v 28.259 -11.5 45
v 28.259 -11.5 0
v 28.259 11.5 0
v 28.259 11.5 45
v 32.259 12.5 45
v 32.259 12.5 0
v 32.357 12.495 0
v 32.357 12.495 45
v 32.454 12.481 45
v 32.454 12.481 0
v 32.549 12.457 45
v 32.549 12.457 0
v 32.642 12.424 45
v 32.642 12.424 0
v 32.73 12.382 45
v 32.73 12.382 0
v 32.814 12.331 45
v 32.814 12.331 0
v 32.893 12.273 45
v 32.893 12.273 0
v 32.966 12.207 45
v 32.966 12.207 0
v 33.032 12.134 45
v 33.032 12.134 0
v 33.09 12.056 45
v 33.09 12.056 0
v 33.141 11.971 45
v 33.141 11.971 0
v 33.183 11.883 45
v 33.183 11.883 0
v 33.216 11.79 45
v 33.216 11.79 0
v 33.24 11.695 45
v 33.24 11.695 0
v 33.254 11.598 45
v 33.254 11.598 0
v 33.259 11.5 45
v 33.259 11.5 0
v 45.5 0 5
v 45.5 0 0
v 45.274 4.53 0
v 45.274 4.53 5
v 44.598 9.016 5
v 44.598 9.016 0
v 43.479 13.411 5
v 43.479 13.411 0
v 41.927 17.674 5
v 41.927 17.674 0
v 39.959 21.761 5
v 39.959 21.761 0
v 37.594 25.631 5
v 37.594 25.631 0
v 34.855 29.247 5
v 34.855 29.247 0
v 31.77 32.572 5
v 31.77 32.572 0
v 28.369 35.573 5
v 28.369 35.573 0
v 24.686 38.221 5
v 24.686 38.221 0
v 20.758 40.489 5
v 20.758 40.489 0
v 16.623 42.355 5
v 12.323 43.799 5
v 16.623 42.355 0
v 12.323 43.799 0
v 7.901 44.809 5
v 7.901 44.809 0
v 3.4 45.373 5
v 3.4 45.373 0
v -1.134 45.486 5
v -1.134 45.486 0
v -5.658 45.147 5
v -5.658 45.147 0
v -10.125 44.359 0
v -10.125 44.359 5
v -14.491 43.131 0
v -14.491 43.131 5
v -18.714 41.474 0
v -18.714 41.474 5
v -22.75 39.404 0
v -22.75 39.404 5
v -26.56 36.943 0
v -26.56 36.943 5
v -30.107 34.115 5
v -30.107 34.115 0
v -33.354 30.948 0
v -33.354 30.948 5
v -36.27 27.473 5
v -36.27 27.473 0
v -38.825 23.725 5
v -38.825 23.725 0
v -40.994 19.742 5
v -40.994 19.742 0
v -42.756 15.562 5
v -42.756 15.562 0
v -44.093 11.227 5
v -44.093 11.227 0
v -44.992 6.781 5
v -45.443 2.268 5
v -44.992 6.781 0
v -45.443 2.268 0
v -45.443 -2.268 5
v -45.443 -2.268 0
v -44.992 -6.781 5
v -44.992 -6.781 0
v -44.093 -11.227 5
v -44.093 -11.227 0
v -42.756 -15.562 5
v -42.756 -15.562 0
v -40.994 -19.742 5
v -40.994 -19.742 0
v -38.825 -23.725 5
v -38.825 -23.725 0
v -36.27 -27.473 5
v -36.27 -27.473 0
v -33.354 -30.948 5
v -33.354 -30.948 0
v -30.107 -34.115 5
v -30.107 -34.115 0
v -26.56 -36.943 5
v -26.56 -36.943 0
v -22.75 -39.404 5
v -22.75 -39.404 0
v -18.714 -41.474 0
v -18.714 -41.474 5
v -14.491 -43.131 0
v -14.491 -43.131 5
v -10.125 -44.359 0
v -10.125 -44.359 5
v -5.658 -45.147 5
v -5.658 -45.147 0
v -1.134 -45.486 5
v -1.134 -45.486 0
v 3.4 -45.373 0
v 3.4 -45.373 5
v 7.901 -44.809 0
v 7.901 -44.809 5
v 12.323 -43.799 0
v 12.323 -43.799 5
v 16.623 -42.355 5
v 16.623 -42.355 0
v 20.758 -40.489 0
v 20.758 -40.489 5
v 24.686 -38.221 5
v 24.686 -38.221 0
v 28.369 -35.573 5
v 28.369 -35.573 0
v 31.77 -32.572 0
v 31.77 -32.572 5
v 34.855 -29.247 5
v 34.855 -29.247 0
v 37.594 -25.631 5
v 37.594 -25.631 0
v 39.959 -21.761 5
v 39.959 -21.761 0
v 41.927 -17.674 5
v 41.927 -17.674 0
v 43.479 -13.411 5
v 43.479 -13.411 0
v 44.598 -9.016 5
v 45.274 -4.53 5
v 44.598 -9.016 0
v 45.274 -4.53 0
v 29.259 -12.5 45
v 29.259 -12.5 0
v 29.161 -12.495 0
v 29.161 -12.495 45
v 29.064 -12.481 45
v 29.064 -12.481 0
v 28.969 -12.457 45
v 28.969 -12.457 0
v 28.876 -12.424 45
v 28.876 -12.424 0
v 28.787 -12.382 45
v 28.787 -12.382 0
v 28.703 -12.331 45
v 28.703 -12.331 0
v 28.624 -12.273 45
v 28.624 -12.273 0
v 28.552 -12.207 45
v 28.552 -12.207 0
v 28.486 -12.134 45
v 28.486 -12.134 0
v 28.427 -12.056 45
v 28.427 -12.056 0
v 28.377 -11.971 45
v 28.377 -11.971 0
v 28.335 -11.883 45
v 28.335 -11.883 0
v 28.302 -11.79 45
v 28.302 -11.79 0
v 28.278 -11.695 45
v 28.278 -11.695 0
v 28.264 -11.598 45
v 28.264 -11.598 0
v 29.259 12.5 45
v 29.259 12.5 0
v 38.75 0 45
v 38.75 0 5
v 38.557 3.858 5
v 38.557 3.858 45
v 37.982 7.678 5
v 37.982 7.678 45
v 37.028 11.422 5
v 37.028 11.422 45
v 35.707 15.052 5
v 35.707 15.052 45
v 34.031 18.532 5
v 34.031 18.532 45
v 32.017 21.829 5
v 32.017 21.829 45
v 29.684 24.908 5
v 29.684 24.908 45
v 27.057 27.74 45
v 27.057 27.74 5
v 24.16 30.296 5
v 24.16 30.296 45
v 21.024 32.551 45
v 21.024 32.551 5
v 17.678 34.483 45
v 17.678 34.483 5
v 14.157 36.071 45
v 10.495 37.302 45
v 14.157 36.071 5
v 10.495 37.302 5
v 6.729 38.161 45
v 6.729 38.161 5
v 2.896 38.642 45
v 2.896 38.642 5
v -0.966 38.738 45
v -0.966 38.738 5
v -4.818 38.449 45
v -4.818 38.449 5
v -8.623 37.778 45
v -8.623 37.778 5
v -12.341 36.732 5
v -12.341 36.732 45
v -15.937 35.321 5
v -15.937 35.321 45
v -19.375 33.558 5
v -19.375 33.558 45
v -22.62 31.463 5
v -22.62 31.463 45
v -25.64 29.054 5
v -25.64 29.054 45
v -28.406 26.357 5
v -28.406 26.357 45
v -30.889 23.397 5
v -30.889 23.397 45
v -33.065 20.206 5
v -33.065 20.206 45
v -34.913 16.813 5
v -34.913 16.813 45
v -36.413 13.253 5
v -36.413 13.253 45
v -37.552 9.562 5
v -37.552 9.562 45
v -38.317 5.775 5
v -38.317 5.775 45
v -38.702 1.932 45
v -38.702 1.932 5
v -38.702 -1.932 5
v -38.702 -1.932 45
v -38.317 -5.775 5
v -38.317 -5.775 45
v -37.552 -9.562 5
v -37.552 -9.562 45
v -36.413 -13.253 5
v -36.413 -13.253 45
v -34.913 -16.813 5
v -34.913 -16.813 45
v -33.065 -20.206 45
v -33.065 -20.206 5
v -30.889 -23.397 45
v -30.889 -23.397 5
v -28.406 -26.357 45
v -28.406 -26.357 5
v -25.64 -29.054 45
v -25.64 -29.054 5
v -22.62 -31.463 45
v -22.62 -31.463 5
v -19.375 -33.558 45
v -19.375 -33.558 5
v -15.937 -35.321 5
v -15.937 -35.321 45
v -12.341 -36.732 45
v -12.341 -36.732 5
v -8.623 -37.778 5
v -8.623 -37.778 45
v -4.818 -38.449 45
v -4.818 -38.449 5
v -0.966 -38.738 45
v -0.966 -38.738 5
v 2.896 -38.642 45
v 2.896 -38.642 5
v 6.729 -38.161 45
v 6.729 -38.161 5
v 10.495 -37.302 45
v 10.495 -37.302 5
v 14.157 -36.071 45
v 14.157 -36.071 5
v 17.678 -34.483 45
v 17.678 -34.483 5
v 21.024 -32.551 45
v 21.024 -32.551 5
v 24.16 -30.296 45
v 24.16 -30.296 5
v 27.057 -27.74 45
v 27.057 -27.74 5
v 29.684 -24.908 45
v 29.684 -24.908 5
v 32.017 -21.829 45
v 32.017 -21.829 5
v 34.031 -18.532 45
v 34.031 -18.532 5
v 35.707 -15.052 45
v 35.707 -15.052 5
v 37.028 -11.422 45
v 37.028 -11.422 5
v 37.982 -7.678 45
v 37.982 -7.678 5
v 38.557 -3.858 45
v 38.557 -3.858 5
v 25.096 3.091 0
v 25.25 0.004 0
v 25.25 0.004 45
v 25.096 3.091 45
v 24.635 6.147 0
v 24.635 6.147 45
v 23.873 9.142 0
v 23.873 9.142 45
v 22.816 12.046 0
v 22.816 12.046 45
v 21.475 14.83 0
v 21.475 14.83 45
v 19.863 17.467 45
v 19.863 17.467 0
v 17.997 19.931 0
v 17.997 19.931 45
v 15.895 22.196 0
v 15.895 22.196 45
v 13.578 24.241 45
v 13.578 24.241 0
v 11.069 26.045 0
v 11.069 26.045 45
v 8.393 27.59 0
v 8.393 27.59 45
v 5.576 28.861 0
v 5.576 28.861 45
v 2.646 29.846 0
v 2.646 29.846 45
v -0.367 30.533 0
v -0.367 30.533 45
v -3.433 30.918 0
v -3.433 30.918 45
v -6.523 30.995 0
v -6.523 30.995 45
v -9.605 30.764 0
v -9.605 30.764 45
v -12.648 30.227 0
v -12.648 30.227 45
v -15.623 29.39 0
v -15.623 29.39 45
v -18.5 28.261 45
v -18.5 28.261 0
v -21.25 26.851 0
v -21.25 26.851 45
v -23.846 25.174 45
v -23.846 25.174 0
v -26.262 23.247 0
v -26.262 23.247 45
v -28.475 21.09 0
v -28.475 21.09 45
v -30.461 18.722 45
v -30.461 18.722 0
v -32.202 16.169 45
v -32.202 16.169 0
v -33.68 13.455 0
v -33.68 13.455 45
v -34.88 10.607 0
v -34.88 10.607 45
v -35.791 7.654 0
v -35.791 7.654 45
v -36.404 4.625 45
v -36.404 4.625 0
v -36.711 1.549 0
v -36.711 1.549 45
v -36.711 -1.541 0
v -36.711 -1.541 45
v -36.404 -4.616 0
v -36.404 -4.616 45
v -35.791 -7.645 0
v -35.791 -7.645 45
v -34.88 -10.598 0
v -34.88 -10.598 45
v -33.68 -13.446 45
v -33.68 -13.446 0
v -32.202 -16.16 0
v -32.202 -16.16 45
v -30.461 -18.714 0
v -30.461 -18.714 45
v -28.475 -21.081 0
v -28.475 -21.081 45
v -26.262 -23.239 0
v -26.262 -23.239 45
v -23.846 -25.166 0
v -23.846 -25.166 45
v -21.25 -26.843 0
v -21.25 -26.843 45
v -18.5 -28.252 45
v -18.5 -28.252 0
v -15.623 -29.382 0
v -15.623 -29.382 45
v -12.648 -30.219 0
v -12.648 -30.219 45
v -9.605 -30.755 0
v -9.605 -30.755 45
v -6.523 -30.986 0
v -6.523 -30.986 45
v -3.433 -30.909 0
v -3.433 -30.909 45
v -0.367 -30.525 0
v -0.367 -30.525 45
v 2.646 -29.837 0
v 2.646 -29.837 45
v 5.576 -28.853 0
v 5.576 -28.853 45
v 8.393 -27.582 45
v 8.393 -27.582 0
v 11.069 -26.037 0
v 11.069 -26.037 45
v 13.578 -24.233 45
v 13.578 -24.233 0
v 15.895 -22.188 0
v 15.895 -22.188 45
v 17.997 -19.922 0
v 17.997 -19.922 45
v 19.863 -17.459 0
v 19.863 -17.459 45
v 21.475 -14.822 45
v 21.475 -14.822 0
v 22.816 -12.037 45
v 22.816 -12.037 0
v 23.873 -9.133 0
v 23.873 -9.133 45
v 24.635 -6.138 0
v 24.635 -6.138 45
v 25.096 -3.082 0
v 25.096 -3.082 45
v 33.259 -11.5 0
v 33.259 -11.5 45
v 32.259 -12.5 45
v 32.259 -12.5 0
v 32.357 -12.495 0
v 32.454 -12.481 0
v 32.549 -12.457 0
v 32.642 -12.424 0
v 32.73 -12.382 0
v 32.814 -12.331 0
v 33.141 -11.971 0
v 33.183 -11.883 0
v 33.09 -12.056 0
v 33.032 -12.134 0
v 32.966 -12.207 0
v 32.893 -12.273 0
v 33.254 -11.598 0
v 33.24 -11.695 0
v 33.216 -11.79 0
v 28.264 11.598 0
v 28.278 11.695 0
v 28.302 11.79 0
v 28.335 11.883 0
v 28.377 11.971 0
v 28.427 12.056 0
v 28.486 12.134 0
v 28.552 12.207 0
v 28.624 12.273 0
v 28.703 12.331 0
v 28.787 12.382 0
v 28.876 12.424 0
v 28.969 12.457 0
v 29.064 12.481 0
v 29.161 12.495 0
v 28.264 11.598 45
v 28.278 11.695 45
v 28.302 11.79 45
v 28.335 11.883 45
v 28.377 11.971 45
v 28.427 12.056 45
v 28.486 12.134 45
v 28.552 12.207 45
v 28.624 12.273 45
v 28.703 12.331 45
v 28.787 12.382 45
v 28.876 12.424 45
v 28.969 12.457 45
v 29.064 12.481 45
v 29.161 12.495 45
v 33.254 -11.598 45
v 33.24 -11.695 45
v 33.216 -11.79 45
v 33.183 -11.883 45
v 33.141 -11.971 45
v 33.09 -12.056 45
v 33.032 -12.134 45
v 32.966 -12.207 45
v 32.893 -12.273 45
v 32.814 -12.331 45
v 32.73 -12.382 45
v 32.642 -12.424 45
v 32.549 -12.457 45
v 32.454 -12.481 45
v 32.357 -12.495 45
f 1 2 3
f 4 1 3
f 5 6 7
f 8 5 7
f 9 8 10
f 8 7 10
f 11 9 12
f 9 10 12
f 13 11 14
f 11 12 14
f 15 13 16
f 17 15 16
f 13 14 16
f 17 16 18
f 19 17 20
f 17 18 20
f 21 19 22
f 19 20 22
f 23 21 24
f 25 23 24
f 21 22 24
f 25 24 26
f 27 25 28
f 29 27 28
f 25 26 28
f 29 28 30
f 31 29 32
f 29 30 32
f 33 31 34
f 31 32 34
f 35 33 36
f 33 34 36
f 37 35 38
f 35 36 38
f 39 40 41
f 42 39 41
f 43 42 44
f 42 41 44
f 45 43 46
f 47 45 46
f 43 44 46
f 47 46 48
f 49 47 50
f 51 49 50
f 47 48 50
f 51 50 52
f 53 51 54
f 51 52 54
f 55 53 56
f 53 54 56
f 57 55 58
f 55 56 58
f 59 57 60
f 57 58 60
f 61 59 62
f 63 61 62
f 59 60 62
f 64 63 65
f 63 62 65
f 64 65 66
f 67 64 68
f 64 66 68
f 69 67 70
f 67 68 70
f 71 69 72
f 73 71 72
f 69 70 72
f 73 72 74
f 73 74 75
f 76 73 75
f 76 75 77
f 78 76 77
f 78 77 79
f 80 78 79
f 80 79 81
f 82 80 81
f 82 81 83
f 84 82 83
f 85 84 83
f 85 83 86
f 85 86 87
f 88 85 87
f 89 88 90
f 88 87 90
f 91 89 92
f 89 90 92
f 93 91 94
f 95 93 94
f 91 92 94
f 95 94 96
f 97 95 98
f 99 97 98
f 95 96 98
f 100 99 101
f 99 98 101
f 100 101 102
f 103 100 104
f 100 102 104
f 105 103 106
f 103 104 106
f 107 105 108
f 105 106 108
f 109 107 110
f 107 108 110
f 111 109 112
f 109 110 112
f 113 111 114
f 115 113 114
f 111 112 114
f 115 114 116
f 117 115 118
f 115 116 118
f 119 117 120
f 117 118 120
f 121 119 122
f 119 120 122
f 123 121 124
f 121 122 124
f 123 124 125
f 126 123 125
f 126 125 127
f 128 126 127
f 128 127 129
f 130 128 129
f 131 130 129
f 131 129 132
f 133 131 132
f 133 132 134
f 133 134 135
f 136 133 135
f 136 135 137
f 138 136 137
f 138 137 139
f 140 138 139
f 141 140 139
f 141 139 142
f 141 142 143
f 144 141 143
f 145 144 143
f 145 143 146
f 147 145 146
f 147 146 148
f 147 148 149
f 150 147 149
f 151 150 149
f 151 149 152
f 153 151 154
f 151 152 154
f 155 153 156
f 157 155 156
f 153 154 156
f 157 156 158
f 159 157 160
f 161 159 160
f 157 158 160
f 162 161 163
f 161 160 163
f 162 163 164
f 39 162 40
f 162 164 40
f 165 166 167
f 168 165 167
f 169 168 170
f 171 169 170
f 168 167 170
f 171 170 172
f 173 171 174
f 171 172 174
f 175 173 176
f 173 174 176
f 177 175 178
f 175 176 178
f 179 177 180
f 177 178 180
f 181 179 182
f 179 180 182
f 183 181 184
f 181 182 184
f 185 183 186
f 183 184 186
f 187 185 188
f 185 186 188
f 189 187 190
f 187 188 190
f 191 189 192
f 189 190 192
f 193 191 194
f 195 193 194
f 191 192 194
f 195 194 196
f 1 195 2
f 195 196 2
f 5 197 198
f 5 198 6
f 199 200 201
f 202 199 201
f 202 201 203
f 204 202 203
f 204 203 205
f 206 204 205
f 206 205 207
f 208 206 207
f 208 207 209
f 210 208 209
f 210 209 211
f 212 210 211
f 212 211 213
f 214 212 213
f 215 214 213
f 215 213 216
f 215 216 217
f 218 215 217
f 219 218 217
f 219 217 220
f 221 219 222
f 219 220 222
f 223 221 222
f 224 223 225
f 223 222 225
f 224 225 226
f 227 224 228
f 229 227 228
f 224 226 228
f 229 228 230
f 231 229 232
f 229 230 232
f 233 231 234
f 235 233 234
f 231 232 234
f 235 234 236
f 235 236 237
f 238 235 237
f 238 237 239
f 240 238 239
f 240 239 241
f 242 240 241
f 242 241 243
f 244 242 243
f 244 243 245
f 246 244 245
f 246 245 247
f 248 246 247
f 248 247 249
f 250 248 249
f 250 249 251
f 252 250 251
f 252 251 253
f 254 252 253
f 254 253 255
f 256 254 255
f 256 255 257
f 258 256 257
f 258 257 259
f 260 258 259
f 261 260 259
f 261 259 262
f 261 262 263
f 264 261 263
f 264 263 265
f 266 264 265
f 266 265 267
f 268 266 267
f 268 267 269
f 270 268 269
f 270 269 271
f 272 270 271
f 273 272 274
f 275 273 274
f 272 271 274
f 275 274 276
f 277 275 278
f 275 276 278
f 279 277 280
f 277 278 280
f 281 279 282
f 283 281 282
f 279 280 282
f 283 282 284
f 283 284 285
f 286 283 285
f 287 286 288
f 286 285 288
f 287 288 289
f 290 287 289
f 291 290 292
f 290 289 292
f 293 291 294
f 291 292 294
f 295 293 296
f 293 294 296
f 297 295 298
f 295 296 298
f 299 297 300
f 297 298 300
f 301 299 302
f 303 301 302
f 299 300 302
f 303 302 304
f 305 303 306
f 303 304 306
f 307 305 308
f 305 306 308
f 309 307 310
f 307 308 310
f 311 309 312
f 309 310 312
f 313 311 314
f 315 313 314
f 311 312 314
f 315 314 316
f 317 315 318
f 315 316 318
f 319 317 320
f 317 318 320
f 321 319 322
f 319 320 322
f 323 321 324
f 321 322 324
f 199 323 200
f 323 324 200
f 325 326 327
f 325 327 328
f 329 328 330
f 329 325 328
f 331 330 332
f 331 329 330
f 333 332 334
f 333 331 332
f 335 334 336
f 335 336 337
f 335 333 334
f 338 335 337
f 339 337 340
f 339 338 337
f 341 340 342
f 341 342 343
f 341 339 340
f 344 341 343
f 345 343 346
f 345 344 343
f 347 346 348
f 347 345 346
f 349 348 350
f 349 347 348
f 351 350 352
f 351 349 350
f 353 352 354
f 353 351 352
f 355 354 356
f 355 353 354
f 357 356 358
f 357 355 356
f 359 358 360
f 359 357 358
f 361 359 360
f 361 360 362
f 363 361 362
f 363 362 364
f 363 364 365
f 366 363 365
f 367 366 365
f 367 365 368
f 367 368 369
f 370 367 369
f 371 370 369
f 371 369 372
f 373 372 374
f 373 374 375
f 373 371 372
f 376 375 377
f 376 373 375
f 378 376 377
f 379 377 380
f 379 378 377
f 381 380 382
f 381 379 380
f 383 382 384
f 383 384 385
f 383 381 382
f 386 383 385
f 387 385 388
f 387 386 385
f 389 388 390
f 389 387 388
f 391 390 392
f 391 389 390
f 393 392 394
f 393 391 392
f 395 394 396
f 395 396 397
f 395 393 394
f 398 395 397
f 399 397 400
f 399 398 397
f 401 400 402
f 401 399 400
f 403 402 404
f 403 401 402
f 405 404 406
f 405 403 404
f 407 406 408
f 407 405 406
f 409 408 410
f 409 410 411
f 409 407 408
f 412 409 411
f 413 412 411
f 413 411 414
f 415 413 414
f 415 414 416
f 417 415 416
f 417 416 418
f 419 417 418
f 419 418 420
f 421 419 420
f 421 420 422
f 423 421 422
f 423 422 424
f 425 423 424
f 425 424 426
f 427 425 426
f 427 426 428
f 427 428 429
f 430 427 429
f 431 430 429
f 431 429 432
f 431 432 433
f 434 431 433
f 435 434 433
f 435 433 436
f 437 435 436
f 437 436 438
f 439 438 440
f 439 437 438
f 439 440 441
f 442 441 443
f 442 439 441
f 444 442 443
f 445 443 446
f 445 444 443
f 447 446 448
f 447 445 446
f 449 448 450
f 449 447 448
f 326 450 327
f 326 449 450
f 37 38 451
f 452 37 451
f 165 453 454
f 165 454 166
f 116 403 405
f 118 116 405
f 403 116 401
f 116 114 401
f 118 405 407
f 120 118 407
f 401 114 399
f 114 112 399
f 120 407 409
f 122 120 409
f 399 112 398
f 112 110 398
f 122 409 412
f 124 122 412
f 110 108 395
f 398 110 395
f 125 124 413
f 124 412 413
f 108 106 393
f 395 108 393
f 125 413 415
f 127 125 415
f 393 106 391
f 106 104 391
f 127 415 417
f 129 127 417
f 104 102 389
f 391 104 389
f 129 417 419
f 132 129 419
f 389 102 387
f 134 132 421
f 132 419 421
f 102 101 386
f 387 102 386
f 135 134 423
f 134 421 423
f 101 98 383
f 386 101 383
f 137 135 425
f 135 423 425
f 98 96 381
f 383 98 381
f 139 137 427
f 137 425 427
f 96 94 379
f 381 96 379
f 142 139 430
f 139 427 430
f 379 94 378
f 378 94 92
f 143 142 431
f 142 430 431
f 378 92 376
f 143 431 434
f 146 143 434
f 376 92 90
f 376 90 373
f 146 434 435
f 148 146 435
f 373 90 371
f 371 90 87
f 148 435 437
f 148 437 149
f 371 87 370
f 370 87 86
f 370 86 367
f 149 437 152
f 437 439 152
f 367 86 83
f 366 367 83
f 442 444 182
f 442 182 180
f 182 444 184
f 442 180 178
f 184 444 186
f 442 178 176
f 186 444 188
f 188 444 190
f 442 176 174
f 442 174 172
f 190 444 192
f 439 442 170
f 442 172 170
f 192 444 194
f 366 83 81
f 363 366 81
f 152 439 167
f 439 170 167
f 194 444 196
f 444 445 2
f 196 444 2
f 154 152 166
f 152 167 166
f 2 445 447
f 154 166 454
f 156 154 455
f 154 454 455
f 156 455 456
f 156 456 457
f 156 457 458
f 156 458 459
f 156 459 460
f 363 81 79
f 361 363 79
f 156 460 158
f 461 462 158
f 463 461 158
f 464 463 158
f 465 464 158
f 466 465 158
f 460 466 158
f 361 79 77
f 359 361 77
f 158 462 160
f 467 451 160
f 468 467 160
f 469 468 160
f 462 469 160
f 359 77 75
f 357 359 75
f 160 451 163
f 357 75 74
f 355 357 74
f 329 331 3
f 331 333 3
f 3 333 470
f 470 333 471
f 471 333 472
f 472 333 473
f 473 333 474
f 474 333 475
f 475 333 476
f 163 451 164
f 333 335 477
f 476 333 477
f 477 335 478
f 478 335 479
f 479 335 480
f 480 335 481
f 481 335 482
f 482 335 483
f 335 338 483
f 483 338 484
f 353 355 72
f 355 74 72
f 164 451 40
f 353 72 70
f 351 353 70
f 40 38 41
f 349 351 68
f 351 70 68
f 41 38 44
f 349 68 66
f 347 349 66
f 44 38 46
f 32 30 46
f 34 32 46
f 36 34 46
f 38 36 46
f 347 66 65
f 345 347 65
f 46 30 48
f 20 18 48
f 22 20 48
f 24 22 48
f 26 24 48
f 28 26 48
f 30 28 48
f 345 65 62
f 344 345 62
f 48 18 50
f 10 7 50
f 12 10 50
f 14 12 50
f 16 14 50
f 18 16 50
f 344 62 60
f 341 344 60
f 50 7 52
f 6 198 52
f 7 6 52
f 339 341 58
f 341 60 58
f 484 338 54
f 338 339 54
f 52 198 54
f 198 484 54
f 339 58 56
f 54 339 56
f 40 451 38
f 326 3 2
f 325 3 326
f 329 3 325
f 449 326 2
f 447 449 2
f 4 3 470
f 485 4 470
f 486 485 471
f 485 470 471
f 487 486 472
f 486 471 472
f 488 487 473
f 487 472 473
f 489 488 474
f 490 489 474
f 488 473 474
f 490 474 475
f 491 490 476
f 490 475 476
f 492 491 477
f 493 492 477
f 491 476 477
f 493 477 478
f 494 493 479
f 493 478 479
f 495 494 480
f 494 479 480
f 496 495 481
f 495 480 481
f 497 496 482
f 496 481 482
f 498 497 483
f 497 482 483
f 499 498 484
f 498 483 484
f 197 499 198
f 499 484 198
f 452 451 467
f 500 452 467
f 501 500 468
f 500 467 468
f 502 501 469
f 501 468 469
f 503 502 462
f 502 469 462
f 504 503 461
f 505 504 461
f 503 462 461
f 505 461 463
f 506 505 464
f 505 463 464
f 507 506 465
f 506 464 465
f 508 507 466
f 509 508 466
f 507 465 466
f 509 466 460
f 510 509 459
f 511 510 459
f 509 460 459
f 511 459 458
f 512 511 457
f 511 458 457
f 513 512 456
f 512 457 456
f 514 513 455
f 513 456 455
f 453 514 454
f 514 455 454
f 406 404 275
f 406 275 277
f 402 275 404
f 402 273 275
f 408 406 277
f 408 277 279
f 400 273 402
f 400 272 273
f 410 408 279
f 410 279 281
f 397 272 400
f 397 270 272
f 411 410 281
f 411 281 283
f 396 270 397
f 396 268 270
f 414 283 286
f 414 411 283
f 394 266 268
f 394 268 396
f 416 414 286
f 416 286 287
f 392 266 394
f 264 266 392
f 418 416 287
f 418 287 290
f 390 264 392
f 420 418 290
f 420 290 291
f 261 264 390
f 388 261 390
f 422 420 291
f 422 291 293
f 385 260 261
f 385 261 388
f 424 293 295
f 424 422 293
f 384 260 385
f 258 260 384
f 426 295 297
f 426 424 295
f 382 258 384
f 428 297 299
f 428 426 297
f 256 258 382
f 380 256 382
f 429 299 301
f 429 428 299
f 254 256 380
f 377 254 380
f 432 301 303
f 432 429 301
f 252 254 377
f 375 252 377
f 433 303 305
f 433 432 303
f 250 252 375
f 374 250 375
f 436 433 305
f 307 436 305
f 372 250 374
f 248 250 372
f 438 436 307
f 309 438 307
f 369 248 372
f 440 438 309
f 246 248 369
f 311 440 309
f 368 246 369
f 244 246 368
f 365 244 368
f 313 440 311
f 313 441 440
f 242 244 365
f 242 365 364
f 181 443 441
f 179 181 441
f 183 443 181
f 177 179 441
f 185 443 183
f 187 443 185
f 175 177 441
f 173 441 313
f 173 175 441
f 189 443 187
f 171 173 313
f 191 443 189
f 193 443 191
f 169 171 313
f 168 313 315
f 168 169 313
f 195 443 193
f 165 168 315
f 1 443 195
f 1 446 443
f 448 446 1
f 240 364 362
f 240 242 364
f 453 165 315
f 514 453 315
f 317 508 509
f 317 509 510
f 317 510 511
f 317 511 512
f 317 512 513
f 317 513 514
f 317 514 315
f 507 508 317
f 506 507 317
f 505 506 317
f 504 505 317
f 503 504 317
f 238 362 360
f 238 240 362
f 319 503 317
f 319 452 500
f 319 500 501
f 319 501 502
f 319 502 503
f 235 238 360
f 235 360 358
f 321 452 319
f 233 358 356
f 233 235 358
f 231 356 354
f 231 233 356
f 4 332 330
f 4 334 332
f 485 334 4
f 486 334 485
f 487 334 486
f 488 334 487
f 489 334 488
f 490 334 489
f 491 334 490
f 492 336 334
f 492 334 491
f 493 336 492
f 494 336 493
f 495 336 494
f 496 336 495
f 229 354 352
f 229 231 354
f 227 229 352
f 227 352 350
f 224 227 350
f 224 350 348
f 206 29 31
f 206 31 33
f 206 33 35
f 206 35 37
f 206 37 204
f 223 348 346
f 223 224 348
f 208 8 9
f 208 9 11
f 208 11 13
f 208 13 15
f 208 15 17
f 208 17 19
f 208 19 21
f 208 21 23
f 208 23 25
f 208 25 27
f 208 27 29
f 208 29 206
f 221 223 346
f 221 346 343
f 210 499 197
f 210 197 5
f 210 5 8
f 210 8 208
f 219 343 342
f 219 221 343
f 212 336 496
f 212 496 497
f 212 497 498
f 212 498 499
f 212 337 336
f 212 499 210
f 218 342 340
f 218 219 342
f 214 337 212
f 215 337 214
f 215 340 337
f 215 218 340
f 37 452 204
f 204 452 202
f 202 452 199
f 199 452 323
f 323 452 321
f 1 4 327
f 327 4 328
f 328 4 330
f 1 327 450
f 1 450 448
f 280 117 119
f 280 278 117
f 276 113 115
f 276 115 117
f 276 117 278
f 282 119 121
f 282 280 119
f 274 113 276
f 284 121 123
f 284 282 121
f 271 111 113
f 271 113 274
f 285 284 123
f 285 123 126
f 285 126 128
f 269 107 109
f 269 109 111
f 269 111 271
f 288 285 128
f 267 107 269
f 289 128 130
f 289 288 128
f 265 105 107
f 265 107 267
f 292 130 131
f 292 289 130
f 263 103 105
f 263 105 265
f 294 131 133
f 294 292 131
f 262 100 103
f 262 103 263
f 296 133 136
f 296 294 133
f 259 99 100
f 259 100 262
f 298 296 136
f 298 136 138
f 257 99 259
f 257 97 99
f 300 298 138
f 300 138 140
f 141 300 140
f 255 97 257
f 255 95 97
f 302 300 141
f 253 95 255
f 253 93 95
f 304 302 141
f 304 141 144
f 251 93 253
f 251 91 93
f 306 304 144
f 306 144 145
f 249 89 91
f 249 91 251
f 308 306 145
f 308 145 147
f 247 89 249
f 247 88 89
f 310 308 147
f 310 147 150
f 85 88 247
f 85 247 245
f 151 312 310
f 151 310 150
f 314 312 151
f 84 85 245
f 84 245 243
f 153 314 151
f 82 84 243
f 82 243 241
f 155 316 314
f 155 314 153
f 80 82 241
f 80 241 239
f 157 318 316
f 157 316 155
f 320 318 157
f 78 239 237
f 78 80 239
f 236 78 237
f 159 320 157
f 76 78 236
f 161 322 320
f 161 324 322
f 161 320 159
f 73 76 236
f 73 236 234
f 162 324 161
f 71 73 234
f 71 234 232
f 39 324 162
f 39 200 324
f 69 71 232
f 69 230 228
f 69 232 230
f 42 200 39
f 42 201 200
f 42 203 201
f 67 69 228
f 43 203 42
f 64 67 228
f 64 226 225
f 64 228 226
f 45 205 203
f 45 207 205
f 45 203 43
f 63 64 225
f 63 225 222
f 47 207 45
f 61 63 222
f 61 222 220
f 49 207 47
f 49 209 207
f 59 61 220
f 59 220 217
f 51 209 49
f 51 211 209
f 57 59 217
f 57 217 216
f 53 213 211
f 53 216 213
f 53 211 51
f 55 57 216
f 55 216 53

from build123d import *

# Parameters (mm, degrees)
F0_R     = 45.5
F0_R_2   = 38.75
F1_DEPTH = 5
F0_R_3   = 31
F2_DEPTH = 45


with BuildPart() as f1:
    # F0 (on Top) → F1 (new body)
    with BuildSketch(Plane.XY):
        Circle(F0_R)
        Circle(F0_R_2, mode=Mode.SUBTRACT)
    extrude(amount=F1_DEPTH)

    # F0 (on Top) → F2 (join)
    with BuildSketch(Plane.XY):
        Circle(F0_R_2)
        with Locations((-5.749998, 0.004193)):
            Circle(F0_R_3, mode=Mode.SUBTRACT)
        with BuildLine():
            ThreePointArc((33.258886, -11.5), (32.965992, -12.207107), (32.258886, -12.5))
            Line((32.258886, -12.5), (29.258886, -12.5))
            ThreePointArc((29.258886, -12.5), (28.551779, -12.207107), (28.258886, -11.5))
            Line((28.258886, -11.5), (28.258886, 11.5))
            ThreePointArc((28.258886, 11.5), (28.551779, 12.207107), (29.258886, 12.5))
            Line((29.258886, 12.5), (32.258886, 12.5))
            ThreePointArc((32.258886, 12.5), (32.965992, 12.207107), (33.258886, 11.5))
            Line((33.258886, 11.5), (33.258886, -11.5))
        make_face(mode=Mode.SUBTRACT)
    extrude(amount=F2_DEPTH)


solid = f1.part
